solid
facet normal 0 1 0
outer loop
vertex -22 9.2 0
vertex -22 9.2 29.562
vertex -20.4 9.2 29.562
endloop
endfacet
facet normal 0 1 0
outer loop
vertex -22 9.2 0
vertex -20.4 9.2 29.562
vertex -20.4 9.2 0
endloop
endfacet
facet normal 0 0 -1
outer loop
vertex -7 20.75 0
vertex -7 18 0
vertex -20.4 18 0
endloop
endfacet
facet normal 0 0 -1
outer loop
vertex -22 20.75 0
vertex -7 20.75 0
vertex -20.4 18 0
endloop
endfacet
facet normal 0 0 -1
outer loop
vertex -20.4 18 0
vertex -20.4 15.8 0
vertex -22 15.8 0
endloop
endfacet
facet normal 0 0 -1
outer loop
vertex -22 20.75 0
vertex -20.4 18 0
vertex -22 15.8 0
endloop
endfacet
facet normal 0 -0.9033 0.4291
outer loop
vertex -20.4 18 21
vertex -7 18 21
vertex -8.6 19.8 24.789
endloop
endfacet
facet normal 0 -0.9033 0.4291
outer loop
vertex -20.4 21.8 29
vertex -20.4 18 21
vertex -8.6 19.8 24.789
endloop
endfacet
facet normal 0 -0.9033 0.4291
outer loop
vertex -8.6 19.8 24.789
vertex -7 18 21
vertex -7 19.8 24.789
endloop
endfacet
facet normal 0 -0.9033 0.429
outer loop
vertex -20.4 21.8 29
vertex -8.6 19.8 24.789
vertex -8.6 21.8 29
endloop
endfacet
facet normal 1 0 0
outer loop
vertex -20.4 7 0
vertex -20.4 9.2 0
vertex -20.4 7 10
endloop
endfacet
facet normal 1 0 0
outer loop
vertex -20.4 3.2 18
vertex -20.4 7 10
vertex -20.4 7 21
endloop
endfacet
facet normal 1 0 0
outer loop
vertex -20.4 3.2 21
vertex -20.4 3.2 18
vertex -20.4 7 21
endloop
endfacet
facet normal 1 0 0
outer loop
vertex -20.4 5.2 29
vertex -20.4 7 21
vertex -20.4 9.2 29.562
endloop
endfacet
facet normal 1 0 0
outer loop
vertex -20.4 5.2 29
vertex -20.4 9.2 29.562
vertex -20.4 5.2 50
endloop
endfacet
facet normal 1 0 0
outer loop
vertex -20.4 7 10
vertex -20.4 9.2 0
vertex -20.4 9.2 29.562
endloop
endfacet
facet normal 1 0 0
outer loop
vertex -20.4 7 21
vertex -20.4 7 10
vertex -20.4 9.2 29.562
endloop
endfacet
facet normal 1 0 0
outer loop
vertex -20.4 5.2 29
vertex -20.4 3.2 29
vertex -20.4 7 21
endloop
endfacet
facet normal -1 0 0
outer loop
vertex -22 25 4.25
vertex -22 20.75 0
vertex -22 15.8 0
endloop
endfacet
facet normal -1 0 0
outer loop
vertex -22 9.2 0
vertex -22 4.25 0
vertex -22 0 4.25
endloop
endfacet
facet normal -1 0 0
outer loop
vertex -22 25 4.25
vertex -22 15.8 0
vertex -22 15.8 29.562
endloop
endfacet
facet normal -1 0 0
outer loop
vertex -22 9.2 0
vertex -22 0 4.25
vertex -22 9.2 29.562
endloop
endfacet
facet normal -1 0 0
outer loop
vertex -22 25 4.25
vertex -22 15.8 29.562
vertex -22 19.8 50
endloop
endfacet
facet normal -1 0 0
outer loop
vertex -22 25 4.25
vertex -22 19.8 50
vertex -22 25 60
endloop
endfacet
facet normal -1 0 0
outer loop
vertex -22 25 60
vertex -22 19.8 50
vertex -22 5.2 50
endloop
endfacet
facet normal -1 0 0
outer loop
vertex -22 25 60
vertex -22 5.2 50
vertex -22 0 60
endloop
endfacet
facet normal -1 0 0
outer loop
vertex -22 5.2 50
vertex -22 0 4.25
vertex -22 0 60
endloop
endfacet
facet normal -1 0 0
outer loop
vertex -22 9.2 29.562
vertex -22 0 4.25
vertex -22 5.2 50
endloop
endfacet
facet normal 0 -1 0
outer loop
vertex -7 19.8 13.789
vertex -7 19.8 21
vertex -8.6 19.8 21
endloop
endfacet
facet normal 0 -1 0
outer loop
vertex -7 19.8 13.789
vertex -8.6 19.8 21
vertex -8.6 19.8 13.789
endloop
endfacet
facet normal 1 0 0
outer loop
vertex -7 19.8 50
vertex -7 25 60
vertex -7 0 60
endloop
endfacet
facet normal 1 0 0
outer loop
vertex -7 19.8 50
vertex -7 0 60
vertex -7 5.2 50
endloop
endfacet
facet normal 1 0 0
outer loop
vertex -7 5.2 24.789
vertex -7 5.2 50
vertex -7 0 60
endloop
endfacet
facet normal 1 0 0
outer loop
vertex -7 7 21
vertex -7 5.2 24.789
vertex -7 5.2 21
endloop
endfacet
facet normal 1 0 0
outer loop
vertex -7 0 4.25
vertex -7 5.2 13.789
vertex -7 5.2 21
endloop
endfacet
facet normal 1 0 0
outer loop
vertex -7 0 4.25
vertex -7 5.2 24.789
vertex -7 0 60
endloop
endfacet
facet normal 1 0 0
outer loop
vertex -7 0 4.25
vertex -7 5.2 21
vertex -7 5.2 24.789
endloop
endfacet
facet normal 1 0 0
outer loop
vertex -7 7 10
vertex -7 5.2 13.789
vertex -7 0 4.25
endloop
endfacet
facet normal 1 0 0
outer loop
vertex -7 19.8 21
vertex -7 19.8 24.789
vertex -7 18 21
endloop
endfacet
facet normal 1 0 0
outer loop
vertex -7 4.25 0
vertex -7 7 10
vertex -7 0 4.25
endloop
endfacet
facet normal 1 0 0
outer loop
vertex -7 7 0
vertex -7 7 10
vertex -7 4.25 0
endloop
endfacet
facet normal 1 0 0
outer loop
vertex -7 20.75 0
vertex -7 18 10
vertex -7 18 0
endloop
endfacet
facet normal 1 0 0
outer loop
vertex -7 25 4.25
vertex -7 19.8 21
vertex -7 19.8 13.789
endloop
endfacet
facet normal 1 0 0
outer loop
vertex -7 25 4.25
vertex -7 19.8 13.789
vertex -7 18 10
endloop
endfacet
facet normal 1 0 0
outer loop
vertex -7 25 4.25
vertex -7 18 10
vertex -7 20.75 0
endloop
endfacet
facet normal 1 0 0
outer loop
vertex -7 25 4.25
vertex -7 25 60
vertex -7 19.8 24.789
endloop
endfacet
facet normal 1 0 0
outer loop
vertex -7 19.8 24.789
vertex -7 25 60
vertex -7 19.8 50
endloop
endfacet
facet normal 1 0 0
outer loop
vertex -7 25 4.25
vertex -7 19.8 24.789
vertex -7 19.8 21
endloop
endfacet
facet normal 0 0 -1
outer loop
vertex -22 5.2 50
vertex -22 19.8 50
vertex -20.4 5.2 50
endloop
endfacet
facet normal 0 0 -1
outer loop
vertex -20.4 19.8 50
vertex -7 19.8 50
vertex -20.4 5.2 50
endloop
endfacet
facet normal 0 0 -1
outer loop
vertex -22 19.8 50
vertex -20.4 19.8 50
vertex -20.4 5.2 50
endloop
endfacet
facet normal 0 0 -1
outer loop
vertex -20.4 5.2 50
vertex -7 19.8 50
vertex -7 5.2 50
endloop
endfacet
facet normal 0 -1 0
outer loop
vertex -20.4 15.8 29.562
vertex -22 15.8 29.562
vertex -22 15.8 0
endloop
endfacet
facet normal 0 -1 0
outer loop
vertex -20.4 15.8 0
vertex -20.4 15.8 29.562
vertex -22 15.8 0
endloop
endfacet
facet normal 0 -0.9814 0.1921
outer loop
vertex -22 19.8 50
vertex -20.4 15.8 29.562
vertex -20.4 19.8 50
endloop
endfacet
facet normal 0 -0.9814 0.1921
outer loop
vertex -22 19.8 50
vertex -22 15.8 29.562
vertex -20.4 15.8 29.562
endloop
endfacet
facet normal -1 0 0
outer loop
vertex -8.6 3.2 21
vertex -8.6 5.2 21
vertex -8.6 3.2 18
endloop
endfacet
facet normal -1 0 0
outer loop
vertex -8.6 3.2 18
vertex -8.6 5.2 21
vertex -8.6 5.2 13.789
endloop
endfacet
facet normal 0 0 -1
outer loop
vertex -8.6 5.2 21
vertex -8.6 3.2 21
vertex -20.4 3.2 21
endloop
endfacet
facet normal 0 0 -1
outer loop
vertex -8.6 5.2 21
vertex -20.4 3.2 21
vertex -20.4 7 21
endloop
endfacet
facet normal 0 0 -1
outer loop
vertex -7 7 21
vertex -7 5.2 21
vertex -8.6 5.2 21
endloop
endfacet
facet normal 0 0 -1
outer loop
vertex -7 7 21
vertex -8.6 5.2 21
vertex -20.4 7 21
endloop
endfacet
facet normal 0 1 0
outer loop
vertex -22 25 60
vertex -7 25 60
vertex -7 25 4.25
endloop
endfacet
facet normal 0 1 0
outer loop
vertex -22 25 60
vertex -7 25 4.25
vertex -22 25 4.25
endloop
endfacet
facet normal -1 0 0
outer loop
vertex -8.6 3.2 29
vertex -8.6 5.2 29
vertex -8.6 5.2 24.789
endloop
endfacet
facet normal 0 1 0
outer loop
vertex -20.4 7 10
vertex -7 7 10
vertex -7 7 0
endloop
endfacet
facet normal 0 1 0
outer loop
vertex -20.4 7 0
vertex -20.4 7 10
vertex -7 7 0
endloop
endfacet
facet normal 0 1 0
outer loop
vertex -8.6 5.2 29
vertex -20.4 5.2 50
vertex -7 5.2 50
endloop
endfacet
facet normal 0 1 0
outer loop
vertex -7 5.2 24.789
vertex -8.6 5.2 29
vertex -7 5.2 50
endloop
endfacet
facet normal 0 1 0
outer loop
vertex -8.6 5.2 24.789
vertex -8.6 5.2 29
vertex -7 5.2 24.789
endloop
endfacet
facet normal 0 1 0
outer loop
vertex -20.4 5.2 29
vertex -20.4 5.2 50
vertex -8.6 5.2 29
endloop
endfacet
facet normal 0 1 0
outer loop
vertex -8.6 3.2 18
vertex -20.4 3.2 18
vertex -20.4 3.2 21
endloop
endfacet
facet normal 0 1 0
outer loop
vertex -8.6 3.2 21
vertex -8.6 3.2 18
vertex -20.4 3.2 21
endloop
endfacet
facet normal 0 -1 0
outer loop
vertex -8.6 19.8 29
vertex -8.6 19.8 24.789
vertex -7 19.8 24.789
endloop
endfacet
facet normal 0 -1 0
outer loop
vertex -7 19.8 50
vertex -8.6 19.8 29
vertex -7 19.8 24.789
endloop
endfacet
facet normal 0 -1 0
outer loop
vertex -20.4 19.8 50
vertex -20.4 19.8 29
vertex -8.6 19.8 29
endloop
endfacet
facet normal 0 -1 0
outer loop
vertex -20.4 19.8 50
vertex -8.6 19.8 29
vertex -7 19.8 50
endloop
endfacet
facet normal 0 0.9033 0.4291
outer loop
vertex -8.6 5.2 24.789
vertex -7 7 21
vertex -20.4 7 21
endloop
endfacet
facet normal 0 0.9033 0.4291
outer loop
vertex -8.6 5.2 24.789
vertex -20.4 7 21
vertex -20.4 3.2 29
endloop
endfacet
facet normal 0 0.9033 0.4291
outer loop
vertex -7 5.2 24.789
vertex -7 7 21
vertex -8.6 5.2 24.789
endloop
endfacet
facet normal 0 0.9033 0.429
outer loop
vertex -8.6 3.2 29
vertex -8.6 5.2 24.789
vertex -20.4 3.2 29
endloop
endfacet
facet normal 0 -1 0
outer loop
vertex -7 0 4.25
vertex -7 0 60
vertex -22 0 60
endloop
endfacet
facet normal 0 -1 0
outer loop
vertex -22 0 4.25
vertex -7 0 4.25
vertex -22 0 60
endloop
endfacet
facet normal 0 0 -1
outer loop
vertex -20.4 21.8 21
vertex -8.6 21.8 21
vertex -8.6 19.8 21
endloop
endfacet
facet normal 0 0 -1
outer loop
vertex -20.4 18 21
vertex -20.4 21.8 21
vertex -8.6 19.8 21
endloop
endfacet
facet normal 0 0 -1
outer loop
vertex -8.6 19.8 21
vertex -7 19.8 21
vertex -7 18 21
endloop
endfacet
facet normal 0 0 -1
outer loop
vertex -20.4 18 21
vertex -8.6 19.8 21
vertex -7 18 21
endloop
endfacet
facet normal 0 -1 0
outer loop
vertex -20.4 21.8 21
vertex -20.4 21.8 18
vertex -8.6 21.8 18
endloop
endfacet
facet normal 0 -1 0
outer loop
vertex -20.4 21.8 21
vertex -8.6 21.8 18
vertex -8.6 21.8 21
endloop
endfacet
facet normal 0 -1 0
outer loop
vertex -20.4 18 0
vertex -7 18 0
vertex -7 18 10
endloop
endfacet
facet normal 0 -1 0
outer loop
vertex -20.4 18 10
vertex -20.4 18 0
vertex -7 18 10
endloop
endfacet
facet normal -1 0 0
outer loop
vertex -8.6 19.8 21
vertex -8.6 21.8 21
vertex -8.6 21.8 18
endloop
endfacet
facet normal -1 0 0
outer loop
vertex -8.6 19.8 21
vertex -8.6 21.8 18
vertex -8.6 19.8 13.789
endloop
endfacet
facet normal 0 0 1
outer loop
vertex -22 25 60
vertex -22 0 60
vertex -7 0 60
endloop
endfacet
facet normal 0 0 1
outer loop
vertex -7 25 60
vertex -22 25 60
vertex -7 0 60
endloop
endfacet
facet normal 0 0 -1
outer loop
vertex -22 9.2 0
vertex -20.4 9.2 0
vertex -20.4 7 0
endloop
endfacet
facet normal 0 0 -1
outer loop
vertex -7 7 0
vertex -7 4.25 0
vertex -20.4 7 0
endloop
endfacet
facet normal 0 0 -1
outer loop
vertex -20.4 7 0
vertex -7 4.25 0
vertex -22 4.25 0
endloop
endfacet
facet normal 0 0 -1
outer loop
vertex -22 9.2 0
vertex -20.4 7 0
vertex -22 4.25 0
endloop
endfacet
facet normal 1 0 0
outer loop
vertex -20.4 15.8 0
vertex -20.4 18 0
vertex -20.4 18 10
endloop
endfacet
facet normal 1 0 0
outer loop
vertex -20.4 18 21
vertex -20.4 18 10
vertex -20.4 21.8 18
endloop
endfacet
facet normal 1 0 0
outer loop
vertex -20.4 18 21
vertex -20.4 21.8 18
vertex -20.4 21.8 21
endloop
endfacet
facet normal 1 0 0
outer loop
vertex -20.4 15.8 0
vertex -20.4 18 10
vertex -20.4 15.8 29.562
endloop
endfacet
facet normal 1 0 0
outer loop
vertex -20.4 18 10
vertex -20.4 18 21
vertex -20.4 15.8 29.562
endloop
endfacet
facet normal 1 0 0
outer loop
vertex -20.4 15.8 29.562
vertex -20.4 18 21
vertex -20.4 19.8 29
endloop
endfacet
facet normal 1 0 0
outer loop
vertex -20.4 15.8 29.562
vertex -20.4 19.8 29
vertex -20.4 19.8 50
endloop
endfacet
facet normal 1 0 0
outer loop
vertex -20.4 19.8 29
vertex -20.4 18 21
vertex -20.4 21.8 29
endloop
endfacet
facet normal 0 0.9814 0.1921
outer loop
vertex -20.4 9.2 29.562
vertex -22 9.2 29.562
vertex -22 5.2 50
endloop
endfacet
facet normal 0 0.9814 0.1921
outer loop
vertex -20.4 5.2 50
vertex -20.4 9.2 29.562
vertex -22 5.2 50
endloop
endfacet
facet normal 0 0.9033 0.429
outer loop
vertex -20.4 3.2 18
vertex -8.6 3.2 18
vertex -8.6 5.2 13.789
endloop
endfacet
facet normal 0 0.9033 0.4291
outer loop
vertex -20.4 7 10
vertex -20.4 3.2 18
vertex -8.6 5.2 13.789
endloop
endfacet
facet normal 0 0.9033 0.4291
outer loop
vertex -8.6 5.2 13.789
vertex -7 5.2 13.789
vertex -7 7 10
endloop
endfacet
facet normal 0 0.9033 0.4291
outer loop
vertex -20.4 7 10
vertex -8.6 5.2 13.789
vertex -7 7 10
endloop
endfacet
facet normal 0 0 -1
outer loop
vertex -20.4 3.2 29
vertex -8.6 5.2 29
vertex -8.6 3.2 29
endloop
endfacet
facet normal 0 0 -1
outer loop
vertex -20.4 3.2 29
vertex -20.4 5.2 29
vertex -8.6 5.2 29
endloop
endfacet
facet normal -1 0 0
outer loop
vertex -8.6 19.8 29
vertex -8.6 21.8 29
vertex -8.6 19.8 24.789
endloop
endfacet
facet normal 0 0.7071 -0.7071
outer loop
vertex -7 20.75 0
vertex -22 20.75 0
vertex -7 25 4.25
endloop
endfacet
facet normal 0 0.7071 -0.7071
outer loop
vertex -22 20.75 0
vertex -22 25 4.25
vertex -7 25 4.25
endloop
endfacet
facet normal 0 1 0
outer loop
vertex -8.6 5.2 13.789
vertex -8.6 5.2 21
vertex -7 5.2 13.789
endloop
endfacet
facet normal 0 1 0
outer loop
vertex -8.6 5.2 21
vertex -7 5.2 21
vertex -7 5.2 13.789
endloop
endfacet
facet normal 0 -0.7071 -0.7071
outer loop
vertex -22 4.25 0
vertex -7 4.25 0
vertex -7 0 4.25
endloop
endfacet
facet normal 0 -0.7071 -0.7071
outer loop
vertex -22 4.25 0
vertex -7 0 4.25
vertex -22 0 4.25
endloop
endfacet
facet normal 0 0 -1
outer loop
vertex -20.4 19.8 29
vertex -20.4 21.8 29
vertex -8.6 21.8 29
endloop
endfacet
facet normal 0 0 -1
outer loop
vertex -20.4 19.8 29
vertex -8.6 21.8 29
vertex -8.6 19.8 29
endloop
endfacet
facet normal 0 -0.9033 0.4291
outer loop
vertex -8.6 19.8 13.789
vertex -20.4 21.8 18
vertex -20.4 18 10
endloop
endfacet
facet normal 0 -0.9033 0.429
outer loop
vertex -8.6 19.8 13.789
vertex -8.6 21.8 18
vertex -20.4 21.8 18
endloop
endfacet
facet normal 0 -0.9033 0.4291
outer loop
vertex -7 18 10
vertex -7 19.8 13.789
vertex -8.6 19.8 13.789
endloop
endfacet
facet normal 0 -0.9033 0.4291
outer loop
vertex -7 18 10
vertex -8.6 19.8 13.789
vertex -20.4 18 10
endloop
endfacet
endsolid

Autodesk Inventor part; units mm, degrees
ref_plane "YZ Plane" through (0, 0, 0) normal (1, 0, 0) x (0, 1, 0)
ref_plane "XZ Plane" through (0, 0, 0) normal (0, 1, 0) x (-1, 0, 0)
ref_plane "XY Plane" through (0, 0, 0) normal (0, 0, 1) x (1, 0, 0)
sketch "Эскиз1" plane through (0, 0, 0) normal (0, 1, 0) x (-1, 0, 0)
  line L0 (0, 0) -> (22, 0)
  line L1 (22, 0) -> (22, 60)
  line L2 (22, 60) -> (0, 60)
  line L3 (0, 60) -> (0, 0)
  dimension "d0" = 22
  dimension "d1" = 60
extrude "Выдавливание1" add sketch "Эскиз1" along normal blind 25
sketch "Эскиз2" plane through (0, 0, 60) normal (1, 0, 0) x (0, 0, -1)
  line L0 (60, 25) -> (0, 25) projected
  line L1 (60, 25) -> (60, 21.8)
  line L2 (60, 0) -> (60, 25) projected
  line L3 (60, 21.8) -> (20, 21.8)
  line L4 (60, 0) -> (0, 0) projected
  line L5 (60, 0) -> (60, 3.2)
  line L6 (60, 3.2) -> (20, 3.2)
  line L7 (20, 25) -> (20, 0)
  line L8 (20, 21.8) -> (28, 21.8)
  line L9 (20, 12.5) -> (60, 12.5)
  line L10 (60, 12.5) -> (60, 18)
  line L11 (60, 18) -> (13, 18)
  line L12 (28, 21.8) -> (28, 18)
  line L13 (28, 18) -> (20, 21.8)
  line L14 (28, 21.8) -> (31, 21.8)
  line L15 (31, 21.8) -> (39, 21.8)
  line L16 (39, 21.8) -> (39, 18)
  line L17 (39, 18) -> (31, 21.8)
  line L18 (39, 21.8) -> (42, 21.8)
  line L19 (42, 21.8) -> (50, 21.8)
  line L20 (50, 21.8) -> (50, 18)
  line L21 (42, 21.8) -> (50, 18)
  line L22 (20, 3.2) -> (28, 3.2)
  line L23 (28, 3.2) -> (28, 7)
  line L24 (28, 7) -> (20, 3.2)
  line L25 (31, 3.2) -> (39, 3.2)
  line L26 (39, 3.2) -> (39, 7)
  line L27 (39, 7) -> (31, 3.2)
  line L28 (42, 3.2) -> (50, 3.2)
  line L29 (50, 3.2) -> (50, 7)
  line L30 (42, 3.2) -> (50, 7)
  line L31 (50, 7) -> (63, 7)
  point P0 (22, 21.8)
  point P1 (60, 7)
  dimension "d4" = 3.2
  dimension "d5" = 3.2
  dimension "d6" = 40
  dimension "d7" = 5.5
  dimension "d8" = 8
  dimension "d9" = 8
  dimension "d10" = 3
  dimension "d11" = 8
extrude "Выдавливание2" cut sketch "Эскиз2" against normal through all contours L13 L11 L7 | L2 L9 L7 L11 | L3 L17 L11 L12 | L2 L31 L30 L6 L26 L27 L23 L24 L7 L9 | L11 L16 L3 L21
sketch "Эскиз3" plane through (0, 0, 60) normal (1, 0, 0) x (0, 0, -1)
  line L0 (50, 18) -> (60, 18) projected
  line L1 (60, 18) -> (60, 25) projected
  line L2 (0, 25) -> (60, 25) projected
  line L3 (0, 0) -> (0, 25) projected
  line L4 (0, 0) -> (60, 0) projected
  line L5 (60, 0) -> (60, 7) projected
  line L6 (60, 7) -> (50, 7) projected
  line L7 (50, 7) -> (42, 3.2) projected
  line L8 (42, 3.2) -> (39, 3.2) projected
  line L9 (39, 3.2) -> (39, 7) projected
  line L10 (39, 7) -> (31, 3.2) projected
  line L11 (31, 3.2) -> (28, 3.2) projected
  line L12 (28, 3.2) -> (28, 7) projected
  line L13 (28, 7) -> (20, 3.2) projected
  line L14 (20, 3.2) -> (20, 21.8) projected
  line L15 (20, 21.8) -> (28, 18) projected
  line L16 (28, 18) -> (28, 21.8) projected
  line L17 (28, 21.8) -> (31, 21.8) projected
  line L18 (31, 21.8) -> (39, 18) projected
  line L19 (39, 18) -> (39, 21.8) projected
  line L20 (39, 21.8) -> (42, 21.8) projected
  line L21 (42, 21.8) -> (50, 18) projected
chamfer "Фаска1" distance 4.25 angle 45 2 edges at (-11, 0, 0) (-11, 25, 0)
sketch "Эскиз4" plane through (0, 0, 60) normal (1, 0, 0) x (0, 0, -1)
  line L0 (20, 21.8) -> (28, 18) projected
  line L1 (20, 21.8) -> (31, 21.8)
  line L2 (31, 21.8) -> (31, 16.575)
  line L3 (31, 16.575) -> (20, 16.575)
  line L4 (20, 16.575) -> (20, 21.8)
  line L5 (20, 3.2) -> (20, 21.8) projected
  line L6 (20, 3.2) -> (30, 3.2)
  line L7 (30, 3.2) -> (30, 12)
  line L8 (30, 12) -> (20, 12)
  line L9 (20, 12) -> (20, 3.2)
  line L10 (20, 21.8) -> (10, 21.8)
  line L11 (10, 21.8) -> (10, 3.2)
  line L12 (10, 3.2) -> (20, 3.2)
  line L13 (20, 3.2) -> (20, 21.8)
  point P0 (60, 0)
extrude "Выдавливание3" cut sketch "Эскиз4" against normal through all
sketch "Эскиз5" plane through (0, 0, 60) normal (1, 0, 0) x (0, 0, -1)
  line L0 (31, 3.2) -> (10, 3.2) projected
  line L1 (10, 3.2) -> (10, 21.8) projected
  line L2 (10, 21.8) -> (31, 21.8) projected
  line L3 (31, 21.8) -> (39, 18) projected
  line L4 (39, 18) -> (39, 21.8) projected
  line L5 (39, 21.8) -> (42, 21.8) projected
  line L6 (42, 21.8) -> (50, 18) projected
  line L7 (50, 18) -> (60, 18) projected
  line L8 (60, 18) -> (60, 20.75) projected
  line L9 (55.75, 25) -> (60, 20.75) projected
  line L10 (0, 25) -> (55.75, 25) projected
  line L11 (0, 0) -> (0, 25) projected
  line L12 (0, 0) -> (55.75, 0) projected
  line L13 (60, 4.25) -> (55.75, 0) projected
  line L14 (60, 4.25) -> (60, 7) projected
  line L15 (60, 7) -> (50, 7) projected
  line L16 (50, 7) -> (42, 3.2) projected
  line L17 (42, 3.2) -> (39, 3.2) projected
  line L18 (39, 3.2) -> (39, 7) projected
  line L19 (39, 7) -> (31, 3.2) projected
  point P0 (60, 0)
extrude "Выдавливание4" cut sketch "Эскиз5" against normal blind 7
sketch "Эскиз6" plane through (-22, 0, 60) normal (-1, 0, 0) x (0, 0, 1)
  line L0 (-10, 21.8) -> (-10, 3.2) projected
  line L1 (-10, 3.2) -> (-10, 5.2)
  line L2 (-10, 5.2) -> (-31, 5.2)
  line L3 (-31, 5.2) -> (-31, 3.2)
  line L4 (-10, 3.2) -> (-31, 3.2) projected
  line L5 (-31, 3.2) -> (-39, 7) projected
  line L6 (-39, 7) -> (-39, 3.2) projected
  line L7 (-39, 3.2) -> (-42, 3.2) projected
  line L8 (-42, 3.2) -> (-50, 7) projected
  line L9 (-50, 7) -> (-60, 7) projected
  line L10 (-60, 4.25) -> (-60, 7) projected
  line L11 (-55.75, 0) -> (-60, 4.25) projected
  line L12 (-55.75, 0) -> (0, 0) projected
  line L13 (0, 0) -> (0, 25) projected
  line L14 (-55.75, 25) -> (0, 25) projected
  line L15 (-60, 20.75) -> (-55.75, 25) projected
  line L16 (-60, 18) -> (-60, 20.75) projected
  line L17 (-60, 18) -> (-50, 18) projected
  line L18 (-50, 18) -> (-42, 21.8) projected
  line L19 (-42, 21.8) -> (-39, 21.8) projected
  line L20 (-39, 21.8) -> (-39, 18) projected
  line L21 (-39, 18) -> (-31, 21.8) projected
  line L22 (-31, 21.8) -> (-10, 21.8) projected
  line L23 (-10, 21.8) -> (-10, 3.2) projected
  line L24 (-10, 21.8) -> (-31, 21.8)
  line L25 (-31, 21.8) -> (-31, 19.8)
  line L26 (-31, 19.8) -> (-10, 19.8)
  line L27 (-10, 19.8) -> (-10, 21.8)
  point P0 (-60, 0)
  point P1 (-31, 3.2)
  point P2 (-31, 21.8)
  dimension "d21" = 2
  dimension "d22" = 21
  dimension "d23" = 2
extrude "Выдавливание5" add sketch "Эскиз6" against normal up to surface (15 mm away) contours L0 L26 L25 L22 | L0 L4 L3 L2
sketch "Эскиз7" plane through (-22, 0, 60) normal (-1, 0, 0) x (0, 0, 1)
  line L0 (-10, 19.8) -> (-10, 5.2) projected
  line L1 (-10, 5.2) -> (-25, 5.2)
  line L2 (-25, 5.2) -> (-25, 9.2)
  line L3 (-25, 9.2) -> (-10, 9.2)
  line L4 (-10, 9.2) -> (-10, 5.2)
  line L5 (-10, 19.8) -> (-25, 19.8)
  line L6 (-25, 19.8) -> (-25, 15.8)
  line L7 (-25, 15.8) -> (-10, 15.8)
  line L8 (-10, 15.8) -> (-10, 19.8)
  line L9 (-31, 3.2) -> (-39, 7) projected
  line L10 (-39, 7) -> (-39, 3.2) projected
  line L11 (-39, 3.2) -> (-42, 3.2) projected
  line L12 (-42, 3.2) -> (-50, 7) projected
  line L13 (-50, 7) -> (-60, 7) projected
  line L14 (-60, 4.25) -> (-60, 7) projected
  line L15 (-55.75, 0) -> (-60, 4.25) projected
  line L16 (-55.75, 0) -> (0, 0) projected
  line L17 (0, 0) -> (0, 25) projected
  line L18 (-55.75, 25) -> (0, 25) projected
  line L19 (-60, 20.75) -> (-55.75, 25) projected
  line L20 (-60, 18) -> (-60, 20.75) projected
  line L21 (-60, 18) -> (-50, 18) projected
  line L22 (-50, 18) -> (-42, 21.8) projected
  line L23 (-42, 21.8) -> (-39, 21.8) projected
  line L24 (-39, 21.8) -> (-39, 18) projected
  line L25 (-39, 18) -> (-31, 21.8) projected
  line L26 (-31, 21.8) -> (-31, 19.8) projected
  line L27 (-31, 19.8) -> (-10, 19.8) projected
  line L28 (-10, 19.8) -> (-10, 5.2) projected
  line L29 (-10, 5.2) -> (-31, 5.2) projected
  line L30 (-31, 5.2) -> (-31, 3.2) projected
  line L31 (-60, 18) -> (-60, 7)
  line L32 (-25, 9.2) -> (-60, 9.2)
  line L33 (-25, 15.8) -> (-64.95, 15.8)
  line L34 (-30.4379, 9.2) -> (-10, 5.2)
  line L35 (-30.4379, 15.8) -> (-10, 19.8)
  point P0 (-60, 0)
  point P1 (-25, 19.8)
  point P2 (-25, 5.2)
  point P3 (-25, 5.2)
  point P4 (-60, 15.8)
  point P5 (-25, 19.8)
  dimension "d27" = 4
  dimension "d29" = 4
extrude "Выдавливание6" add sketch "Эскиз7" against normal blind 1.6 contours L35 L6 L5 | L6 L35 L33 L31 L21 L22 L23 L24 L25 L26 L27 | L1 L2 L34 | L29 L30 L9 L10 L11 L12 L13 L31 L32 L34 L2
sketch "Эскиз8" plane through (-7, 0, 60) normal (1, 0, 0) x (0, 0, -1)
  line L0 (31, 19.8) -> (72, 19.8)
  line L1 (31, 5.2) -> (69, 5.2)
  line L2 (50, 7) -> (60, 7) projected
  line L3 (42, 3.2) -> (50, 7) projected
  line L4 (39, 3.2) -> (42, 3.2) projected
  line L5 (39, 7) -> (39, 3.2) projected
  line L6 (31, 3.2) -> (39, 7) projected
  line L7 (31, 3.2) -> (31, 5.2) projected
  line L8 (31, 5.2) -> (10, 5.2) projected
  line L9 (10, 19.8) -> (10, 5.2) projected
  line L10 (10, 19.8) -> (31, 19.8) projected
  line L11 (31, 19.8) -> (31, 21.8) projected
  line L12 (39, 18) -> (31, 21.8) projected
  line L13 (39, 21.8) -> (39, 18) projected
  line L14 (42, 21.8) -> (39, 21.8) projected
  line L15 (50, 18) -> (42, 21.8) projected
  line L16 (60, 18) -> (50, 18) projected
  line L17 (60, 20.75) -> (60, 18) projected
  line L18 (55.75, 25) -> (60, 20.75) projected
  line L19 (0, 25) -> (55.75, 25) projected
  line L20 (0, 0) -> (0, 25) projected
  line L21 (55.75, 0) -> (0, 0) projected
  line L22 (60, 4.25) -> (55.75, 0) projected
  line L23 (60, 7) -> (60, 4.25) projected
  point P0 (60, 0)
  point P1 (46.2105, 5.2)
  point P2 (39, 5.2)
  point P3 (35.2105, 5.2)
  point P4 (35.2105, 19.8)
  point P5 (39, 19.8)
  point P6 (46.2105, 19.8)
extrude "Выдавливание7" add sketch "Эскиз8" against normal blind 1.6 contours L11 L12 L0 | L13 L14 L15 L0 | L1 L6 L7 | L1 L3 L4 L5
properties part number "встав для крюка"
